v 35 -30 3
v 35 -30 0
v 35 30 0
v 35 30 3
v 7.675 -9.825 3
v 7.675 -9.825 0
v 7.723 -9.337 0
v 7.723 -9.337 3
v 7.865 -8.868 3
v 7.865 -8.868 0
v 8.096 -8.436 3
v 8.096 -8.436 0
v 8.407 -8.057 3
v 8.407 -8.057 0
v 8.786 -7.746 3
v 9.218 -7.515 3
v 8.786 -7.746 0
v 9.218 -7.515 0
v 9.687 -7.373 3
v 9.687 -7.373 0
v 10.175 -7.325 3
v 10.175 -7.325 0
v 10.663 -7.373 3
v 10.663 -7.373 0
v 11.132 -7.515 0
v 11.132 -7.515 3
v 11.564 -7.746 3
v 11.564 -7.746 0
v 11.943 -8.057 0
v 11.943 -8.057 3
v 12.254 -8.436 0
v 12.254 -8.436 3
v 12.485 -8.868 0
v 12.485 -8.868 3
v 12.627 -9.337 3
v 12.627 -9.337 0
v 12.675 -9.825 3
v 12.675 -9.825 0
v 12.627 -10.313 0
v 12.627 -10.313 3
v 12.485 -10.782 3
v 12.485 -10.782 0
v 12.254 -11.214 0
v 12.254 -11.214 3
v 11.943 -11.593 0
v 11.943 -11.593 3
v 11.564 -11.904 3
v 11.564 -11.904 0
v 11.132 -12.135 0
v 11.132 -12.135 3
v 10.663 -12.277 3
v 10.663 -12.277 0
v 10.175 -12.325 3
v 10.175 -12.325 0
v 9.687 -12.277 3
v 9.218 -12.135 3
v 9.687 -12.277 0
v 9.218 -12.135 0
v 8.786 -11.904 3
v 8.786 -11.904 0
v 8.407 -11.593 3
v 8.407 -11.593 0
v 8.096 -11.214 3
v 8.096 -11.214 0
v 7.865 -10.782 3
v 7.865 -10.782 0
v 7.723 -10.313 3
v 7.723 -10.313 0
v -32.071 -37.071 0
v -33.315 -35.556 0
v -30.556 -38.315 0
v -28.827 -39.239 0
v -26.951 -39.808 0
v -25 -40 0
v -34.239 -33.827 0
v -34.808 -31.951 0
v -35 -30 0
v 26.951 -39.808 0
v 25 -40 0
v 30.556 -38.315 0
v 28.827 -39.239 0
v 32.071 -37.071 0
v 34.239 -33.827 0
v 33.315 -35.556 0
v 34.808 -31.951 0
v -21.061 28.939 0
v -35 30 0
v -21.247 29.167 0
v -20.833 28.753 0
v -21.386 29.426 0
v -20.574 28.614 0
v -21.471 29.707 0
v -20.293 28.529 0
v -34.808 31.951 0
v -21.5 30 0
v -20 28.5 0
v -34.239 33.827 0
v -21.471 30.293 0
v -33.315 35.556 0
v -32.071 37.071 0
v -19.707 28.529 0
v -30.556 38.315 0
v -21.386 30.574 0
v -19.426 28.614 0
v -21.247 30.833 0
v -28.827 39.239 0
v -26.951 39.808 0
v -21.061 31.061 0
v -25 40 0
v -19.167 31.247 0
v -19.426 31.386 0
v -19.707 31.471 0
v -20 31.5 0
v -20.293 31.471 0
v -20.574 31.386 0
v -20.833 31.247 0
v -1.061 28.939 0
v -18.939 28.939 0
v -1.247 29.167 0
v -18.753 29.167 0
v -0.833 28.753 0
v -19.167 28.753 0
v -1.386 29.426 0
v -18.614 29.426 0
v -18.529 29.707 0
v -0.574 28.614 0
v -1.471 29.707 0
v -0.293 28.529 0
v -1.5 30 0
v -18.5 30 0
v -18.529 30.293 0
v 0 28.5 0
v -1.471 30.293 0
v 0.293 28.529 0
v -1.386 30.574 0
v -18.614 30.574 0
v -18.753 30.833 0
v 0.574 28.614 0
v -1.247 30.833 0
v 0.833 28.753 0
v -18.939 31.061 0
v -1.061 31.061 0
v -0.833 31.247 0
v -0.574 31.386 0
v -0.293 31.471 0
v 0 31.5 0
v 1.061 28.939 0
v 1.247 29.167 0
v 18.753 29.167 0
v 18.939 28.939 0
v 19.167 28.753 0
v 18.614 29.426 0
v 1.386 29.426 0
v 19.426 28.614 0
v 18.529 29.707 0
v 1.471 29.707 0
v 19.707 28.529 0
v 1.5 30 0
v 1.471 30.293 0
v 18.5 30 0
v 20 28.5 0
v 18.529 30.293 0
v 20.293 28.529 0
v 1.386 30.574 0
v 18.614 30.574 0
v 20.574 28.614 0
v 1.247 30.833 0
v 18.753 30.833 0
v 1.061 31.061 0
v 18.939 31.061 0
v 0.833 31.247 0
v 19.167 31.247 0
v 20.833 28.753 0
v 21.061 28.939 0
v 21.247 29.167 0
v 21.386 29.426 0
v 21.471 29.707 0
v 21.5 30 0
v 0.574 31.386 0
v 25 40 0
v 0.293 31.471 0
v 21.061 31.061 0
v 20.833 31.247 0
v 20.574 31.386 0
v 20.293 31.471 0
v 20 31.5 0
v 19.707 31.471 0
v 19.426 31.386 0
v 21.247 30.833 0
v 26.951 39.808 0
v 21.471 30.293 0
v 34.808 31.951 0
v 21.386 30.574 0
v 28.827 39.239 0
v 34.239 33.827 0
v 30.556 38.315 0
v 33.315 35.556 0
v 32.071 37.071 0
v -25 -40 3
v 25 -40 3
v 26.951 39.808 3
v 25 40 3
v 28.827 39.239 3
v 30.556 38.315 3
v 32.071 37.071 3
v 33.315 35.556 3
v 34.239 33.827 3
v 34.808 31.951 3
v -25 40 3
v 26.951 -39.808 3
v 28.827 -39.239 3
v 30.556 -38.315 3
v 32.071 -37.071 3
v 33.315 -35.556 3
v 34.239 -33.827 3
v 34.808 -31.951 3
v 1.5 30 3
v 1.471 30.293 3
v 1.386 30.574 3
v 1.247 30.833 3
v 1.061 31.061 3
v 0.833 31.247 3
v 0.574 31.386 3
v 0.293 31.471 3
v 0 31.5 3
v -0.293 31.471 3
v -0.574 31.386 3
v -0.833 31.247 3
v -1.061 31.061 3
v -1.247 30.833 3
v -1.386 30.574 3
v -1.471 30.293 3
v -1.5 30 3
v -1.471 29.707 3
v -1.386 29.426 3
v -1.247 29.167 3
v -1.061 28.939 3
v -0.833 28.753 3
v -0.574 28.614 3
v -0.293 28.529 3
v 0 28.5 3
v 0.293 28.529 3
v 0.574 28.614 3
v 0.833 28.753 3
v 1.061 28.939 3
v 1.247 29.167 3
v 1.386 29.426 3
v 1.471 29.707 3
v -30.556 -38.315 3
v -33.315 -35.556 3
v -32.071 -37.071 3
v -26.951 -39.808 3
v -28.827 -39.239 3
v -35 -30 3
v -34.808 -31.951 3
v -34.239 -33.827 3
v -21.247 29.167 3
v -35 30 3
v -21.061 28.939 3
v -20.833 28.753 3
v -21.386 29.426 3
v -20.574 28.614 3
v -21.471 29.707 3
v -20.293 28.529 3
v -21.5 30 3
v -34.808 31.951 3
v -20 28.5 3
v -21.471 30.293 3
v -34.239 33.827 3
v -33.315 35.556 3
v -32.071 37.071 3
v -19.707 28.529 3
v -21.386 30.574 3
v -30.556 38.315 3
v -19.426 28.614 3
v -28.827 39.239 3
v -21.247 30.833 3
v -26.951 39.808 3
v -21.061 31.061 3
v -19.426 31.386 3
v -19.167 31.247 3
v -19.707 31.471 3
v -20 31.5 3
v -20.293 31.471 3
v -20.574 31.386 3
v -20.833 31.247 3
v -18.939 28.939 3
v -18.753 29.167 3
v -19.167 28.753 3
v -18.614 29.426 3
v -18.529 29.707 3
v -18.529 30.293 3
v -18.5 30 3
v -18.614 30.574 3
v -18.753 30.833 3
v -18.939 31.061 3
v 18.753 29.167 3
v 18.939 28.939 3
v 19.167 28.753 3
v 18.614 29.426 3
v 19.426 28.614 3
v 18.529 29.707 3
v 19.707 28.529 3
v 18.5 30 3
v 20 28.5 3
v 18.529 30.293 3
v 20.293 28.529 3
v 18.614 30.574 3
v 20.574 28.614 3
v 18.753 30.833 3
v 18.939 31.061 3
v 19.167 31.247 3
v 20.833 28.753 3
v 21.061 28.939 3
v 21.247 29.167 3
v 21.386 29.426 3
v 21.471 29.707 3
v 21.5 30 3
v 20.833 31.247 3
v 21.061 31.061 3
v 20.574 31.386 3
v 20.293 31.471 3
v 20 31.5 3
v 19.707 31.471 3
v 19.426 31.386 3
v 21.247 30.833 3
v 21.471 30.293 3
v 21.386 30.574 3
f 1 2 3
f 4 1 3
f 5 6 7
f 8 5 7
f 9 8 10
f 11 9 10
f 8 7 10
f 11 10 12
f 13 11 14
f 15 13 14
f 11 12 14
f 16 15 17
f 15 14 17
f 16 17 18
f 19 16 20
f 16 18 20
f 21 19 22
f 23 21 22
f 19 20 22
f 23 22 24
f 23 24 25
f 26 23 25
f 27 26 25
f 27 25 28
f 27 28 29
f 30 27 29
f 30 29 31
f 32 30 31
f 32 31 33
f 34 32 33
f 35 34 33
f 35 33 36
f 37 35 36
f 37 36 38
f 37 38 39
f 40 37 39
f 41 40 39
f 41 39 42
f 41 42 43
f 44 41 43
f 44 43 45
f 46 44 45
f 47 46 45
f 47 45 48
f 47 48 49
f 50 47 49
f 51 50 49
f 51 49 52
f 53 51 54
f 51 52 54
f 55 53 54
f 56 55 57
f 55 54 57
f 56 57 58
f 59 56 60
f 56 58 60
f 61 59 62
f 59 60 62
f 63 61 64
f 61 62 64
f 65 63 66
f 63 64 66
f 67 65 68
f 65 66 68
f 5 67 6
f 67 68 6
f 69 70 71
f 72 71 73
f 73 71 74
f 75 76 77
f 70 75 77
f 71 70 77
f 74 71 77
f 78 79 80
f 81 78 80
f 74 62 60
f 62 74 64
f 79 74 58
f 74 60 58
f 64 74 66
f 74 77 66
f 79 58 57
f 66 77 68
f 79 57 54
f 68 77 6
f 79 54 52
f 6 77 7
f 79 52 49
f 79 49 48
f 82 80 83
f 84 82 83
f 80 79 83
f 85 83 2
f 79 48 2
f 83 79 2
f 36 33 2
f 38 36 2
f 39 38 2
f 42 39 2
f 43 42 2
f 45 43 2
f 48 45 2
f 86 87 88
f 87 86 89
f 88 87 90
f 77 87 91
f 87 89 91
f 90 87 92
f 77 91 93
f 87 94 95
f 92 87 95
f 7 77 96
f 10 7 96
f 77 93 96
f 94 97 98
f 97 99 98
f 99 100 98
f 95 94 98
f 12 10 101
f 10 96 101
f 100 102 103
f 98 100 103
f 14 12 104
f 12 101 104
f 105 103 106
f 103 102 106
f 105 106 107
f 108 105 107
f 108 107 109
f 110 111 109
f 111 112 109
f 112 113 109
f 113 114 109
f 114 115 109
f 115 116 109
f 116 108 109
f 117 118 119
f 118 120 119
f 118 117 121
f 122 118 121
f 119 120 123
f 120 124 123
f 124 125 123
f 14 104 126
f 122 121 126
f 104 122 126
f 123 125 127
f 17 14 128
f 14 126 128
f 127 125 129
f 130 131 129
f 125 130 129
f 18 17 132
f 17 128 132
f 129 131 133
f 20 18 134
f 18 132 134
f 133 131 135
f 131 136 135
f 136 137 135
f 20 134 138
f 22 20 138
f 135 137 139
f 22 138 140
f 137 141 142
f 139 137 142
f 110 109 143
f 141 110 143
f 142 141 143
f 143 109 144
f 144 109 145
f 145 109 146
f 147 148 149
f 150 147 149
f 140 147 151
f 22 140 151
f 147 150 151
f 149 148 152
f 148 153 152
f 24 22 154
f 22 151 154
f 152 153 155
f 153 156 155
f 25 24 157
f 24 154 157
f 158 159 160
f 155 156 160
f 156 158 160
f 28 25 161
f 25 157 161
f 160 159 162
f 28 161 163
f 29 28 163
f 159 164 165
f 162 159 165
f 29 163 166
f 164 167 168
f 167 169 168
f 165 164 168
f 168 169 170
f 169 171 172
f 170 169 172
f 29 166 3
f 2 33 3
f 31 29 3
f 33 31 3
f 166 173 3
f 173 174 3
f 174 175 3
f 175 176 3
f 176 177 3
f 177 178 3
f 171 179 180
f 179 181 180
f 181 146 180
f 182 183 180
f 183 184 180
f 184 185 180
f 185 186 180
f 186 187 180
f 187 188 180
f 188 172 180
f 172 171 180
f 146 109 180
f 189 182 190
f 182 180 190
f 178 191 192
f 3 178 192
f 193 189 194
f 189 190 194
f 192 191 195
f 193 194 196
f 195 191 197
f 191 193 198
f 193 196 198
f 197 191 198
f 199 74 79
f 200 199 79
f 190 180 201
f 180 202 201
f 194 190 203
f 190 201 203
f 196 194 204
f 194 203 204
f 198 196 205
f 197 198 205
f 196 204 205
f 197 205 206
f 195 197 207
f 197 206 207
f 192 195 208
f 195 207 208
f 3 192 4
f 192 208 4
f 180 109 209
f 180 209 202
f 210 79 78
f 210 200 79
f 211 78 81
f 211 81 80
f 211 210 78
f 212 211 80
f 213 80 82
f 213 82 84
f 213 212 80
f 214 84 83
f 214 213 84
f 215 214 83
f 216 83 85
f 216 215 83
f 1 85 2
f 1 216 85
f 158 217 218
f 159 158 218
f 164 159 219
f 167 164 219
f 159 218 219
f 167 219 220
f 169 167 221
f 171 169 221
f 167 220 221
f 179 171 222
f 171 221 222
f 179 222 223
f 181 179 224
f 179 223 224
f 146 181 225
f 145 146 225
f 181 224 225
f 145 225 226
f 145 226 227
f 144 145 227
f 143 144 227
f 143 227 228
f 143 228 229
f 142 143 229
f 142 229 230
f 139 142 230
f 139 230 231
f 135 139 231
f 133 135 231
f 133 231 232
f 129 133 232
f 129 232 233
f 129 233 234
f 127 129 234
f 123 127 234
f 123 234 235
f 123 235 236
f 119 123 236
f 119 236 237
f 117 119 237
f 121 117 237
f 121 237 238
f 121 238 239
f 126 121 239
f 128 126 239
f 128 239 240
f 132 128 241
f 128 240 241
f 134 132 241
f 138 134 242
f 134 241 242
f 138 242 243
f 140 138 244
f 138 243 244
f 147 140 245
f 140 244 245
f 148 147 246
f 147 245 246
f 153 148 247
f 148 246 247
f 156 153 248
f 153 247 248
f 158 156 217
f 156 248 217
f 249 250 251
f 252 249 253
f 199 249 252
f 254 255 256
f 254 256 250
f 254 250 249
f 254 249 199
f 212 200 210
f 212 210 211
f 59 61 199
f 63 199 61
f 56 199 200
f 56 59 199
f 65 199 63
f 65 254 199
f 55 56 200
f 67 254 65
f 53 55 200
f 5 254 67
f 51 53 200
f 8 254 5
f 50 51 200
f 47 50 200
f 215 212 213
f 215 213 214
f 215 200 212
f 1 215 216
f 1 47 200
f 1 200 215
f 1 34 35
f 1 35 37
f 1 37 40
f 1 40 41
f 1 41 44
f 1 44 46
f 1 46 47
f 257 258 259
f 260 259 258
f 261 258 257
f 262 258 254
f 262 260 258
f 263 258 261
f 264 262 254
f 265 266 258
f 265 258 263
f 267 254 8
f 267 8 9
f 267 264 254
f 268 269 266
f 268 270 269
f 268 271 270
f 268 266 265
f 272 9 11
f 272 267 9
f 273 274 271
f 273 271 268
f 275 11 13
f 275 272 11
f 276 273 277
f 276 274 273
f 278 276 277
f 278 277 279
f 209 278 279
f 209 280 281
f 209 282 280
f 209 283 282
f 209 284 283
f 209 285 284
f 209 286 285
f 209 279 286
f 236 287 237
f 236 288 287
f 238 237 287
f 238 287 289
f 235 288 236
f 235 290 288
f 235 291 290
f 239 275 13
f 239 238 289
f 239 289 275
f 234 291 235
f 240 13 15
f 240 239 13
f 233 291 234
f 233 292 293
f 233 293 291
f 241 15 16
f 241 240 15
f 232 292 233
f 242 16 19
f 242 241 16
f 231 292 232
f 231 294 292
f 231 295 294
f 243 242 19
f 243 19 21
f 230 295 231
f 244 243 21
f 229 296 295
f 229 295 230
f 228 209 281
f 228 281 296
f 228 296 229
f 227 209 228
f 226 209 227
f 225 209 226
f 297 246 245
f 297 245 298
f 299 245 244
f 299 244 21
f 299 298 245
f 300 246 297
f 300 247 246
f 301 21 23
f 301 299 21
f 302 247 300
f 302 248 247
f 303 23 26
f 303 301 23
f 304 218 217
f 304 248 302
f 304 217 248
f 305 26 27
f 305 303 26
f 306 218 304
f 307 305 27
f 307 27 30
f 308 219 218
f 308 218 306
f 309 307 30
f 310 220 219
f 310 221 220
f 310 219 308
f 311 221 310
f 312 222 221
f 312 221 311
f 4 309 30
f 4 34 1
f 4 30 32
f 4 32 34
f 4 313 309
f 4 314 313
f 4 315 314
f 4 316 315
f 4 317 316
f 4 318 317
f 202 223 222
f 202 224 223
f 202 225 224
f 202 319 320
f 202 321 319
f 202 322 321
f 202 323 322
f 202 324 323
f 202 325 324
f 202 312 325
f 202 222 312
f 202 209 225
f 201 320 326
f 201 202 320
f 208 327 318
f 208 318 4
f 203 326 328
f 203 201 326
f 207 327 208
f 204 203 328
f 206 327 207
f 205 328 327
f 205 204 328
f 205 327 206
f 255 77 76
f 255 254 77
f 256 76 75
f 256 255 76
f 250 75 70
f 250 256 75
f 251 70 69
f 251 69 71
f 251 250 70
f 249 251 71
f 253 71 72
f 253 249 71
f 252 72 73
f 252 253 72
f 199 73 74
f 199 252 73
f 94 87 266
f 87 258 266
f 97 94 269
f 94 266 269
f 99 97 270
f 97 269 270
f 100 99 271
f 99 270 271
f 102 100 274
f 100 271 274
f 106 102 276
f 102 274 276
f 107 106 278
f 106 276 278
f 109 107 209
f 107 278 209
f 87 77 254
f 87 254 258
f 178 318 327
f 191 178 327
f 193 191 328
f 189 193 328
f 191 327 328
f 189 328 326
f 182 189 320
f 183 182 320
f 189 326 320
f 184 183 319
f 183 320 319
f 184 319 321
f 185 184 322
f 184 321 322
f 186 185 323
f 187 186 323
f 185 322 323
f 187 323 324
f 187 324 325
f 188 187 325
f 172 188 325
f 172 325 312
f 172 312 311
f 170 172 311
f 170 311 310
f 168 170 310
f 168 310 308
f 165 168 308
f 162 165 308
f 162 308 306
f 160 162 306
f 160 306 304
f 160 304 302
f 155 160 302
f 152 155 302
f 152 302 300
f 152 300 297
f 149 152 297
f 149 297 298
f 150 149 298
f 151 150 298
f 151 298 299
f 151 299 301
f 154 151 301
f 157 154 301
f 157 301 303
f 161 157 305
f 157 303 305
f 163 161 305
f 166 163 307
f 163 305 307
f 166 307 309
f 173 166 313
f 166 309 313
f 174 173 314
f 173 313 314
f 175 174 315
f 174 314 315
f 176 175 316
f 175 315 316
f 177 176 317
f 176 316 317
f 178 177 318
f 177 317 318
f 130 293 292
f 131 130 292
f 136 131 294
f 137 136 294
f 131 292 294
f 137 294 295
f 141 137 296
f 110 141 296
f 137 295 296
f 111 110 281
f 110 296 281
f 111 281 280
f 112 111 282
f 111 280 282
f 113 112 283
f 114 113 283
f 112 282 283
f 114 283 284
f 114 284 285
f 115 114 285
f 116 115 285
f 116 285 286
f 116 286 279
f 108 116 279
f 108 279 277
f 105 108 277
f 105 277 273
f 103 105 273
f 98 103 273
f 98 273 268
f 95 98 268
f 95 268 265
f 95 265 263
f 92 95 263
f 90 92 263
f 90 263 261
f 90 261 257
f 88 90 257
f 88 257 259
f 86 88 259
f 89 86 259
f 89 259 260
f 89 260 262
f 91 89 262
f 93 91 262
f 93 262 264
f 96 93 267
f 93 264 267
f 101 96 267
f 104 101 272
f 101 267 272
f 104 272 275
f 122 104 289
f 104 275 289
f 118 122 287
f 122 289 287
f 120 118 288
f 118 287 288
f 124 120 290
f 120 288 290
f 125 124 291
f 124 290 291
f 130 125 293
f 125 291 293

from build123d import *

# Parameters (mm, degrees)
SKETCH_1_W          = 70
SKETCH_1_H          = 80
EXTRUDE_1_DEPTH     = 3
SKETCH_2_R          = 2.5
CUT_EXTRUDE_1_DEPTH = 10
SKETCH_3_R          = 1.5
CUT_EXTRUDE_2_DEPTH = 10
FILLET_1_R          = 10


with BuildPart() as part:
    # 草图1 → 凸台-拉伸1 (new body)
    with BuildSketch(Plane.XY):
        Rectangle(SKETCH_1_W, SKETCH_1_H)
    extrude(amount=EXTRUDE_1_DEPTH)

    # 草图2 → 切除-拉伸1 (cut)
    with BuildSketch(Plane(origin=(0, 0, 0), x_dir=(-1, 0, 0), z_dir=(0, 0, -1))):
        with Locations((-10.175, -9.825)):
            Circle(SKETCH_2_R)
    extrude(amount=-CUT_EXTRUDE_1_DEPTH, mode=Mode.SUBTRACT)

    # 草图3 → 切除-拉伸2 (cut)
    with BuildSketch(Plane.XY.offset(3)):
        with Locations((0, 30)):
            Circle(SKETCH_3_R)
        with Locations((20, 30)):
            Circle(SKETCH_3_R)
        with Locations((-20, 30)):
            Circle(SKETCH_3_R)
    extrude(amount=-CUT_EXTRUDE_2_DEPTH, mode=Mode.SUBTRACT)

    # 圆角1
    fillet_1_edges = [part.edges().sort_by_distance(p)[0] for p in [
        (35, -40, 1.5),
        (-35, -40, 1.5),
        (-35, 40, 1.5),
        (35, 40, 1.5),
    ]]
    fillet(fillet_1_edges, radius=FILLET_1_R)


solid = part.part
